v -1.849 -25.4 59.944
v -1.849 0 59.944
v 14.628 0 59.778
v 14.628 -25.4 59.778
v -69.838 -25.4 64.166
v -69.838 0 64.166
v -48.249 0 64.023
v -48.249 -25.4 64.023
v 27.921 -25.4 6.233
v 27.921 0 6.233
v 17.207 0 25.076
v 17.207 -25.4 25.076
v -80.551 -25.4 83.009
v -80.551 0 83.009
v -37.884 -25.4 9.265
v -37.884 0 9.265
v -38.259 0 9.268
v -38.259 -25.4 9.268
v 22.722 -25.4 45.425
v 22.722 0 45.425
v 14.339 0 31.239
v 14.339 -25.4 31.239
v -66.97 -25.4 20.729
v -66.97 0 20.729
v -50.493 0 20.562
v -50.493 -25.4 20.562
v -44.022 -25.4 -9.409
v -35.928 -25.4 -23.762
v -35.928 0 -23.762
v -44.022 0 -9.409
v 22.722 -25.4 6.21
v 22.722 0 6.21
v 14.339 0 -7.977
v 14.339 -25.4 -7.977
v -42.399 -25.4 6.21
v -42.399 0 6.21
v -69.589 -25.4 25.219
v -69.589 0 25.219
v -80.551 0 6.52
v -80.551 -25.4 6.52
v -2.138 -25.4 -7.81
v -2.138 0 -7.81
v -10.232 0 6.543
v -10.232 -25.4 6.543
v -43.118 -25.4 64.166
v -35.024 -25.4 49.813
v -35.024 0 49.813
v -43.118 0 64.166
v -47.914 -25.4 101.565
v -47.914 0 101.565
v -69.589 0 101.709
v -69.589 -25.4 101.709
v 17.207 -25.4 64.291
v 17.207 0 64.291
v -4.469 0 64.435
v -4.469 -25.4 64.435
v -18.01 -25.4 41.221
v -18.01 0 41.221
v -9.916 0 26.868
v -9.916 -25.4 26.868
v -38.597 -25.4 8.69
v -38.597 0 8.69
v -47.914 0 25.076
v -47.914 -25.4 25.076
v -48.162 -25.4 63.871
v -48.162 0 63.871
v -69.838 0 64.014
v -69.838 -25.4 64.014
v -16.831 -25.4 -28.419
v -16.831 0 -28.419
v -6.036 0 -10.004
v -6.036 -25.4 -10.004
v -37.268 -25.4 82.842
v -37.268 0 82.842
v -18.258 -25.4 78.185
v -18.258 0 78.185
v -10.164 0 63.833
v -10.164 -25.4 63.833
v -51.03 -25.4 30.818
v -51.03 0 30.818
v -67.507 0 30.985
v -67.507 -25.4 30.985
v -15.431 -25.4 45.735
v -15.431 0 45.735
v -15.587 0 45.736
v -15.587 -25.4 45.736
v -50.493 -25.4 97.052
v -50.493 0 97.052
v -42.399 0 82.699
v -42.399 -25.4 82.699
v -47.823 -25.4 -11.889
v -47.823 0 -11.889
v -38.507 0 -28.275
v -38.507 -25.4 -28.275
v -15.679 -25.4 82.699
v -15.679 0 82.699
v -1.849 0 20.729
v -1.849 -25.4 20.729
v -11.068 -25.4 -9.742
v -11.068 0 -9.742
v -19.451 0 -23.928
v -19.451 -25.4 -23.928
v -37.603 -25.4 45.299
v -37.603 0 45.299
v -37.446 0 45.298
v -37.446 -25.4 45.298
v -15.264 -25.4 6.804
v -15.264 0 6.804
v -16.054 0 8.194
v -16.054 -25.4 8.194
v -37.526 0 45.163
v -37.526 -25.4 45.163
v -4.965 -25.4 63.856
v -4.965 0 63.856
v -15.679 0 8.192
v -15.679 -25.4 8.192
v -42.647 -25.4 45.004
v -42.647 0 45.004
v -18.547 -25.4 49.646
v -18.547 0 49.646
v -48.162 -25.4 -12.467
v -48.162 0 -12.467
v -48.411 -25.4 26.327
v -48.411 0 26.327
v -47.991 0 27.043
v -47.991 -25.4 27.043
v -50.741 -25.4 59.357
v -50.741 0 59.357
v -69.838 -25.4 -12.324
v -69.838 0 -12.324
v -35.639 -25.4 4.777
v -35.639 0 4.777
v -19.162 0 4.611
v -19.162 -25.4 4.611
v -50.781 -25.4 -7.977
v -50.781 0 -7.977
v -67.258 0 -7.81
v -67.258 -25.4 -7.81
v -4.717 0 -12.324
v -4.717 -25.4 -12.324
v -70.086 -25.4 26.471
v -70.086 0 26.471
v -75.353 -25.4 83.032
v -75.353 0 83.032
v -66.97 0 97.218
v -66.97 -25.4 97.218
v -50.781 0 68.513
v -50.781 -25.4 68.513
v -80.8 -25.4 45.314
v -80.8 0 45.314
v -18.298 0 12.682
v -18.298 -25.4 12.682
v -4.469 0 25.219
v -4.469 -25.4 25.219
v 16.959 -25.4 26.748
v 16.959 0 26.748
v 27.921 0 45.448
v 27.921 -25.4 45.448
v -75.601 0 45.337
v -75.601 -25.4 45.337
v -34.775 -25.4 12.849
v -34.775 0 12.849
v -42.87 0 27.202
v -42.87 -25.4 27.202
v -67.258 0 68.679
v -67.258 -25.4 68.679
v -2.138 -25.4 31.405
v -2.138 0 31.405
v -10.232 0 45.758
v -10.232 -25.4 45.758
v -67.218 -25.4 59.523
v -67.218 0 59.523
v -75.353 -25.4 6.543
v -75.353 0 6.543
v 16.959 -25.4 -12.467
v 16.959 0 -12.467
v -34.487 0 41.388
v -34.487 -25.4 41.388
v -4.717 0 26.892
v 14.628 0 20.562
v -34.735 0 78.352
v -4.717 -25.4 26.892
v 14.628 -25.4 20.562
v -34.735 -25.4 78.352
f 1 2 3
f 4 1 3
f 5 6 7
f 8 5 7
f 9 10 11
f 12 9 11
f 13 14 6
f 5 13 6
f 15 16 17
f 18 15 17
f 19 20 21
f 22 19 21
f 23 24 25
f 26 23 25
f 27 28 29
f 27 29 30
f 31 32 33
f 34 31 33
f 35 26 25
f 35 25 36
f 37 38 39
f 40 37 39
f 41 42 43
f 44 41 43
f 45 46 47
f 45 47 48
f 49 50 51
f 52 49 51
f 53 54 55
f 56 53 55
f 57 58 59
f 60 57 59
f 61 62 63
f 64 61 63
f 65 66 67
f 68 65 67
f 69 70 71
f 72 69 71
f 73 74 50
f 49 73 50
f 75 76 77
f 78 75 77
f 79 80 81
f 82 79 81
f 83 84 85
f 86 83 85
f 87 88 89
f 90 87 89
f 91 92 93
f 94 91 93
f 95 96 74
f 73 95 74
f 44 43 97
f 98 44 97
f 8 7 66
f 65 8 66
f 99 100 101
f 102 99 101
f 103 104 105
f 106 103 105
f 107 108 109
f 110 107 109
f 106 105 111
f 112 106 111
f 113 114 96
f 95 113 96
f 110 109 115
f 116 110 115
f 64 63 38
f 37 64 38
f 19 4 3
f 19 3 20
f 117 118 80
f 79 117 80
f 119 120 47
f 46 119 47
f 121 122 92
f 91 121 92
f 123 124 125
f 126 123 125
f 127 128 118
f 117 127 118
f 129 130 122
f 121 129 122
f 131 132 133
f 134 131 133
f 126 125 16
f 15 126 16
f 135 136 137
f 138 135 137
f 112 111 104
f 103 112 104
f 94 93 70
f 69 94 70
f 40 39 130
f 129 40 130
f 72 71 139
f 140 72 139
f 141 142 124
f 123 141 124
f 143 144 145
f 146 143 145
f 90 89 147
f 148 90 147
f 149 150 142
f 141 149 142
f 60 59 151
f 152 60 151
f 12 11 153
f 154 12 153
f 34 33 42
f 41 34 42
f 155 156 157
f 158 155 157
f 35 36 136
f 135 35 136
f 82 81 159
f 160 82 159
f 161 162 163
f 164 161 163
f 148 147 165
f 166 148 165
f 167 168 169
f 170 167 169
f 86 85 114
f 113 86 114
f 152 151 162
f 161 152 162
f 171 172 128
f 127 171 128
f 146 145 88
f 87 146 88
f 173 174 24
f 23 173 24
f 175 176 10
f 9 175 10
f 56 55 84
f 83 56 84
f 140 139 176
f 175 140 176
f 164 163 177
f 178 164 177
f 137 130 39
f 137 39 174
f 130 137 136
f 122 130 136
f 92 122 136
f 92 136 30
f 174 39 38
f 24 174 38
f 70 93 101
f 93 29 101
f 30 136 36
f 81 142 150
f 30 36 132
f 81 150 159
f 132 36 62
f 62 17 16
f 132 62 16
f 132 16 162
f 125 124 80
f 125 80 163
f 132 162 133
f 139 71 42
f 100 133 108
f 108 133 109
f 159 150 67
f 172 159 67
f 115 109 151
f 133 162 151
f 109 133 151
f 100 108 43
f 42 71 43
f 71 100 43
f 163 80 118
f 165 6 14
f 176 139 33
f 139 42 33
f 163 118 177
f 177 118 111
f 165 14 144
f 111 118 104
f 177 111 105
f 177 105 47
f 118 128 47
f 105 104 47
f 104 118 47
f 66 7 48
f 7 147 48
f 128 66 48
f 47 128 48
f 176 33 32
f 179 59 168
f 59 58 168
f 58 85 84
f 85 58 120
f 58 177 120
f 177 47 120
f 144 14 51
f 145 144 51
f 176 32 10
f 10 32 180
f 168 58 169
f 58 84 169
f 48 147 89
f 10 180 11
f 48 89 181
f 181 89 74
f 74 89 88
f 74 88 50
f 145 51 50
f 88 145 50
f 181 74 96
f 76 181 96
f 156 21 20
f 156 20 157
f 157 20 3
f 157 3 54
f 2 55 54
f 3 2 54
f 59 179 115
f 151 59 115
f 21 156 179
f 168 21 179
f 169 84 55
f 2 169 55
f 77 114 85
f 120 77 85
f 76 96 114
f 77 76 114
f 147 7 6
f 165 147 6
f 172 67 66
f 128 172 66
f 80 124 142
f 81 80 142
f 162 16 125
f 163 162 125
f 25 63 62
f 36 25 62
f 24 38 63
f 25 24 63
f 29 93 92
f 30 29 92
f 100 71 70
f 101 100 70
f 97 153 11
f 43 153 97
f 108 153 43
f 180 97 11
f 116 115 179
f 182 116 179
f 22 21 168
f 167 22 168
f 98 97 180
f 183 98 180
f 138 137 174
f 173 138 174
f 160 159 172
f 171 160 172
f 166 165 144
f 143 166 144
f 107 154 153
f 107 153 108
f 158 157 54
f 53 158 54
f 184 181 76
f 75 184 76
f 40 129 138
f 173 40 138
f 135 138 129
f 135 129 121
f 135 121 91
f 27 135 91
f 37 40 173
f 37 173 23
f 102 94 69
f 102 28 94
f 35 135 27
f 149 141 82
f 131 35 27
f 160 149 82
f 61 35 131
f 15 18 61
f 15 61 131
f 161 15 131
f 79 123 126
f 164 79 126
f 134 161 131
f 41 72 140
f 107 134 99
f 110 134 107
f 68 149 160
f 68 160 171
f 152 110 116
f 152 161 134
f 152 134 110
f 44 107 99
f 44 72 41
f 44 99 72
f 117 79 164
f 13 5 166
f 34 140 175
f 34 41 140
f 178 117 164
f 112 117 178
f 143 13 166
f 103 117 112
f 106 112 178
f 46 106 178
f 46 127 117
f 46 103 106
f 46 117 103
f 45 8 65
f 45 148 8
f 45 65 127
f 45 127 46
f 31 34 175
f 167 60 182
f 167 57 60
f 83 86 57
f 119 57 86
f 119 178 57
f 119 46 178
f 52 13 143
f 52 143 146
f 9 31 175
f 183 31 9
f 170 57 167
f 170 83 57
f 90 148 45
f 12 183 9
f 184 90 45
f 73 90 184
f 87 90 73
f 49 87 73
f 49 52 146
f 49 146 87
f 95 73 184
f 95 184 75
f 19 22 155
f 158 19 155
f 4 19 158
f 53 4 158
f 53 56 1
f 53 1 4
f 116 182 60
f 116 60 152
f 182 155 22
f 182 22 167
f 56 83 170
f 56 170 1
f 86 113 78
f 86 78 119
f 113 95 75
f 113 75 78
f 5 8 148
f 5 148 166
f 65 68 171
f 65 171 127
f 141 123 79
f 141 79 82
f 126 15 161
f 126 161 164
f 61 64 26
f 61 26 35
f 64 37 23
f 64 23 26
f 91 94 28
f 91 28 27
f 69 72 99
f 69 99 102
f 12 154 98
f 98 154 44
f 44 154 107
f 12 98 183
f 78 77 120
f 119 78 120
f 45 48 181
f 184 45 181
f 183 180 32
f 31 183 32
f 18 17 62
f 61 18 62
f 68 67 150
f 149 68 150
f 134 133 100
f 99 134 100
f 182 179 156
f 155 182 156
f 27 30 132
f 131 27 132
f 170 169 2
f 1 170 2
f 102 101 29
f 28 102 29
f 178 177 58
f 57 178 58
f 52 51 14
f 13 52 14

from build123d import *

# Parameters (mm, degrees)
F1_DEPTH = 25.4


with BuildPart() as f1:
    # F0 (on Front) → F1 (new body)
    with BuildSketch(Plane.XZ):
        Polygon((-37.5256026256, 45.1629495667), (-37.4485114416, 45.027359658), (-47.9911484283, 27.0428515349), (-37.8835519015, 9.2653571548), (-16.5829657817, 9.1244142096), (-16.054064132, 8.1941687175), (-15.6790532896, 8.1916873242), (-4.7170456877, 26.8915927664), (-15.4306350481, 45.7349225472), (-15.5873630008, 45.7359595938), (-15.927471531, 45.1557741399), (-37.4463405407, 45.2981614319), align=None)
        Polygon((-18.0099271589, 41.2211516747), (-9.9157319855, 26.8684398219), (-18.2984474766, 12.6823052521), (-34.7753581411, 12.8488825352), (-42.8695533144, 27.2015943881), (-34.4868378233, 41.3877289578), align=None, mode=Mode.SUBTRACT)
        Polygon((-47.9911484283, 27.0428515349), (-37.4485114416, 45.027359658), (-37.5256026256, 45.1629495667), (-48.0682396123, 27.1784414436), align=None)
        Polygon((-48.4105190435, 26.3274542158), (-47.9911484283, 27.0428515349), (-48.0682396123, 27.1784414436), (-37.5256026256, 45.1629495667), (-37.6030684933, 45.2991984785), (-48.1621008021, 63.8706894388), (-69.8376977643, 64.0141137774), (-80.7997053662, 45.3142083352), (-70.0861160058, 26.4708785543), align=None)
        Polygon((-50.7413929128, 59.3569185663), (-42.6471977395, 45.0042067135), (-51.0299132306, 30.8180721437), (-67.506823895, 30.9846494268), (-75.6010190684, 45.3373612797), (-67.2183035773, 59.5234958494), align=None, mode=Mode.SUBTRACT)
        Polygon((-16.5829657817, 9.1244142096), (-37.8835519015, 9.2653571548), (-37.3546502519, 8.3351116627), (-16.054064132, 8.1941687175), align=None)
        Polygon((-37.3546502519, 8.3351116627), (-37.8835519015, 9.2653571548), (-38.2585627439, 9.2678385482), (-38.5972650026, 8.6900520296), (-37.2000922861, 6.2326695996), (-47.8233976294, -11.889449324), (-38.5069809854, -28.2753966749), (-16.8313840231, -28.4188210135), (-6.0362439524, -10.003572102), (-15.430634824, 6.5195182768), (-15.2637672928, 6.8041748076), (-16.054064132, 8.1941687175), align=None)
        Polygon((-19.1622578925, 4.6106433371), (-11.0680627191, -9.7420685157), (-19.4507782102, -23.9282030855), (-35.9276888746, -23.7616258024), (-44.021884048, -9.4089139495), (-35.6391685569, 4.7772206202), align=None, mode=Mode.SUBTRACT)
        Polygon((-48.1621008021, 63.8706894388), (-37.6030684933, 45.2991984785), (-37.4463405407, 45.2981614319), (-37.1062320104, 45.8783468858), (-15.5873630008, 45.7359595938), (-4.9654639292, 63.8556795821), (-15.6790532896, 82.6990093629), (-37.2681492183, 82.8418613365), (-37.2000932002, 82.7221627042), (-48.1621008021, 64.022257262), (-48.2486018356, 64.022829627), align=None)
        Polygon((-18.2583454004, 78.1852384904), (-10.164150227, 63.8325266376), (-18.5468657181, 49.6463920679), (-35.0237763825, 49.8129693509), (-43.1179715559, 64.1656812038), (-34.7352560648, 78.3518157735), align=None, mode=Mode.SUBTRACT)
        Polygon((-37.1062320104, 45.8783468858), (-37.4463405407, 45.2981614319), (-15.927471531, 45.1557741399), (-15.5873630008, 45.7359595938), align=None)
        Polygon((-49.2205703458, -9.4320668941), (-38.5972650026, 8.6900520296), (-47.9136816466, 25.0759993804), (-69.5892786088, 25.219423719), (-80.5512862107, 6.5195182768), (-69.8376968503, -12.323811504), (-48.162099888, -12.4672358426), (-47.8233976294, -11.889449324), align=None)
        Polygon((-50.4929737574, 20.562228508), (-42.398778584, 6.2095166551), (-50.7814940751, -7.9766179146), (-67.2584047395, -7.8100406315), (-75.3525999129, 6.5426712213), (-66.9698844218, 20.7288057911), align=None, mode=Mode.SUBTRACT)
        Polygon((-37.2000922861, 6.2326695996), (-38.5972650026, 8.6900520296), (-49.2205703458, -9.4320668941), (-47.8233976294, -11.889449324), align=None)
        Polygon((-69.8376977643, 64.1656816006), (-48.2486018356, 64.022829627), (-48.3166578537, 64.1425282593), (-37.3546502519, 82.8424337015), (-37.2681492183, 82.8418613365), (-47.9136825606, 101.565492485), (-69.5892795229, 101.7089168236), (-80.5512871247, 83.0090113814), align=None)
        Polygon((-50.4929746714, 97.0517216126), (-42.398779498, 82.6990097597), (-50.7814949891, 68.51287519), (-67.2584056535, 68.6794524731), (-75.3526008269, 83.0321643259), (-66.9698853358, 97.2182988957), align=None, mode=Mode.SUBTRACT)
        Polygon((-48.3166578537, 64.1425282593), (-48.2486018356, 64.022829627), (-48.1621008021, 64.022257262), (-37.2000932002, 82.7221627042), (-37.2681492183, 82.8418613365), (-37.3546502519, 82.8424337015), align=None)
        Polygon((-5.8693764213, -9.7189155712), (-15.2637672928, 6.8041748076), (-15.430634824, 6.5195182768), (-6.0362439524, -10.003572102), align=None)
        Polygon((-4.4686272222, 25.219423719), (-15.2637672928, 6.8041748076), (-5.8693764213, -9.7189155712), (-6.0362439524, -10.003572102), (-4.7170454636, -12.323811504), (16.9585514987, -12.4672358426), (27.9205591005, 6.2326695996), (17.2069697401, 25.0759993804), align=None)
        Polygon((14.6276776293, 20.562228508), (22.7218728027, 6.2095166551), (14.3391573116, -7.9766179146), (-2.1377533528, -7.8100406315), (-10.2319485262, 6.5426712213), (-1.8492330351, 20.7288057911), align=None, mode=Mode.SUBTRACT)
        Polygon((-4.4686274462, 64.4348279895), (-15.4306350481, 45.7349225472), (-4.7170456877, 26.8915927664), (16.9585512746, 26.7481684278), (27.9205588764, 45.4480738701), (17.206969516, 64.2914036509), align=None)
        Polygon((14.6276774052, 59.7776327784), (22.7218725786, 45.4249209255), (14.3391570875, 31.2387863558), (-2.1377535769, 31.4053636389), (-10.2319487503, 45.7580754917), (-1.8492332592, 59.9442100615), align=None, mode=Mode.SUBTRACT)
    extrude(amount=F1_DEPTH)


solid = f1.part
